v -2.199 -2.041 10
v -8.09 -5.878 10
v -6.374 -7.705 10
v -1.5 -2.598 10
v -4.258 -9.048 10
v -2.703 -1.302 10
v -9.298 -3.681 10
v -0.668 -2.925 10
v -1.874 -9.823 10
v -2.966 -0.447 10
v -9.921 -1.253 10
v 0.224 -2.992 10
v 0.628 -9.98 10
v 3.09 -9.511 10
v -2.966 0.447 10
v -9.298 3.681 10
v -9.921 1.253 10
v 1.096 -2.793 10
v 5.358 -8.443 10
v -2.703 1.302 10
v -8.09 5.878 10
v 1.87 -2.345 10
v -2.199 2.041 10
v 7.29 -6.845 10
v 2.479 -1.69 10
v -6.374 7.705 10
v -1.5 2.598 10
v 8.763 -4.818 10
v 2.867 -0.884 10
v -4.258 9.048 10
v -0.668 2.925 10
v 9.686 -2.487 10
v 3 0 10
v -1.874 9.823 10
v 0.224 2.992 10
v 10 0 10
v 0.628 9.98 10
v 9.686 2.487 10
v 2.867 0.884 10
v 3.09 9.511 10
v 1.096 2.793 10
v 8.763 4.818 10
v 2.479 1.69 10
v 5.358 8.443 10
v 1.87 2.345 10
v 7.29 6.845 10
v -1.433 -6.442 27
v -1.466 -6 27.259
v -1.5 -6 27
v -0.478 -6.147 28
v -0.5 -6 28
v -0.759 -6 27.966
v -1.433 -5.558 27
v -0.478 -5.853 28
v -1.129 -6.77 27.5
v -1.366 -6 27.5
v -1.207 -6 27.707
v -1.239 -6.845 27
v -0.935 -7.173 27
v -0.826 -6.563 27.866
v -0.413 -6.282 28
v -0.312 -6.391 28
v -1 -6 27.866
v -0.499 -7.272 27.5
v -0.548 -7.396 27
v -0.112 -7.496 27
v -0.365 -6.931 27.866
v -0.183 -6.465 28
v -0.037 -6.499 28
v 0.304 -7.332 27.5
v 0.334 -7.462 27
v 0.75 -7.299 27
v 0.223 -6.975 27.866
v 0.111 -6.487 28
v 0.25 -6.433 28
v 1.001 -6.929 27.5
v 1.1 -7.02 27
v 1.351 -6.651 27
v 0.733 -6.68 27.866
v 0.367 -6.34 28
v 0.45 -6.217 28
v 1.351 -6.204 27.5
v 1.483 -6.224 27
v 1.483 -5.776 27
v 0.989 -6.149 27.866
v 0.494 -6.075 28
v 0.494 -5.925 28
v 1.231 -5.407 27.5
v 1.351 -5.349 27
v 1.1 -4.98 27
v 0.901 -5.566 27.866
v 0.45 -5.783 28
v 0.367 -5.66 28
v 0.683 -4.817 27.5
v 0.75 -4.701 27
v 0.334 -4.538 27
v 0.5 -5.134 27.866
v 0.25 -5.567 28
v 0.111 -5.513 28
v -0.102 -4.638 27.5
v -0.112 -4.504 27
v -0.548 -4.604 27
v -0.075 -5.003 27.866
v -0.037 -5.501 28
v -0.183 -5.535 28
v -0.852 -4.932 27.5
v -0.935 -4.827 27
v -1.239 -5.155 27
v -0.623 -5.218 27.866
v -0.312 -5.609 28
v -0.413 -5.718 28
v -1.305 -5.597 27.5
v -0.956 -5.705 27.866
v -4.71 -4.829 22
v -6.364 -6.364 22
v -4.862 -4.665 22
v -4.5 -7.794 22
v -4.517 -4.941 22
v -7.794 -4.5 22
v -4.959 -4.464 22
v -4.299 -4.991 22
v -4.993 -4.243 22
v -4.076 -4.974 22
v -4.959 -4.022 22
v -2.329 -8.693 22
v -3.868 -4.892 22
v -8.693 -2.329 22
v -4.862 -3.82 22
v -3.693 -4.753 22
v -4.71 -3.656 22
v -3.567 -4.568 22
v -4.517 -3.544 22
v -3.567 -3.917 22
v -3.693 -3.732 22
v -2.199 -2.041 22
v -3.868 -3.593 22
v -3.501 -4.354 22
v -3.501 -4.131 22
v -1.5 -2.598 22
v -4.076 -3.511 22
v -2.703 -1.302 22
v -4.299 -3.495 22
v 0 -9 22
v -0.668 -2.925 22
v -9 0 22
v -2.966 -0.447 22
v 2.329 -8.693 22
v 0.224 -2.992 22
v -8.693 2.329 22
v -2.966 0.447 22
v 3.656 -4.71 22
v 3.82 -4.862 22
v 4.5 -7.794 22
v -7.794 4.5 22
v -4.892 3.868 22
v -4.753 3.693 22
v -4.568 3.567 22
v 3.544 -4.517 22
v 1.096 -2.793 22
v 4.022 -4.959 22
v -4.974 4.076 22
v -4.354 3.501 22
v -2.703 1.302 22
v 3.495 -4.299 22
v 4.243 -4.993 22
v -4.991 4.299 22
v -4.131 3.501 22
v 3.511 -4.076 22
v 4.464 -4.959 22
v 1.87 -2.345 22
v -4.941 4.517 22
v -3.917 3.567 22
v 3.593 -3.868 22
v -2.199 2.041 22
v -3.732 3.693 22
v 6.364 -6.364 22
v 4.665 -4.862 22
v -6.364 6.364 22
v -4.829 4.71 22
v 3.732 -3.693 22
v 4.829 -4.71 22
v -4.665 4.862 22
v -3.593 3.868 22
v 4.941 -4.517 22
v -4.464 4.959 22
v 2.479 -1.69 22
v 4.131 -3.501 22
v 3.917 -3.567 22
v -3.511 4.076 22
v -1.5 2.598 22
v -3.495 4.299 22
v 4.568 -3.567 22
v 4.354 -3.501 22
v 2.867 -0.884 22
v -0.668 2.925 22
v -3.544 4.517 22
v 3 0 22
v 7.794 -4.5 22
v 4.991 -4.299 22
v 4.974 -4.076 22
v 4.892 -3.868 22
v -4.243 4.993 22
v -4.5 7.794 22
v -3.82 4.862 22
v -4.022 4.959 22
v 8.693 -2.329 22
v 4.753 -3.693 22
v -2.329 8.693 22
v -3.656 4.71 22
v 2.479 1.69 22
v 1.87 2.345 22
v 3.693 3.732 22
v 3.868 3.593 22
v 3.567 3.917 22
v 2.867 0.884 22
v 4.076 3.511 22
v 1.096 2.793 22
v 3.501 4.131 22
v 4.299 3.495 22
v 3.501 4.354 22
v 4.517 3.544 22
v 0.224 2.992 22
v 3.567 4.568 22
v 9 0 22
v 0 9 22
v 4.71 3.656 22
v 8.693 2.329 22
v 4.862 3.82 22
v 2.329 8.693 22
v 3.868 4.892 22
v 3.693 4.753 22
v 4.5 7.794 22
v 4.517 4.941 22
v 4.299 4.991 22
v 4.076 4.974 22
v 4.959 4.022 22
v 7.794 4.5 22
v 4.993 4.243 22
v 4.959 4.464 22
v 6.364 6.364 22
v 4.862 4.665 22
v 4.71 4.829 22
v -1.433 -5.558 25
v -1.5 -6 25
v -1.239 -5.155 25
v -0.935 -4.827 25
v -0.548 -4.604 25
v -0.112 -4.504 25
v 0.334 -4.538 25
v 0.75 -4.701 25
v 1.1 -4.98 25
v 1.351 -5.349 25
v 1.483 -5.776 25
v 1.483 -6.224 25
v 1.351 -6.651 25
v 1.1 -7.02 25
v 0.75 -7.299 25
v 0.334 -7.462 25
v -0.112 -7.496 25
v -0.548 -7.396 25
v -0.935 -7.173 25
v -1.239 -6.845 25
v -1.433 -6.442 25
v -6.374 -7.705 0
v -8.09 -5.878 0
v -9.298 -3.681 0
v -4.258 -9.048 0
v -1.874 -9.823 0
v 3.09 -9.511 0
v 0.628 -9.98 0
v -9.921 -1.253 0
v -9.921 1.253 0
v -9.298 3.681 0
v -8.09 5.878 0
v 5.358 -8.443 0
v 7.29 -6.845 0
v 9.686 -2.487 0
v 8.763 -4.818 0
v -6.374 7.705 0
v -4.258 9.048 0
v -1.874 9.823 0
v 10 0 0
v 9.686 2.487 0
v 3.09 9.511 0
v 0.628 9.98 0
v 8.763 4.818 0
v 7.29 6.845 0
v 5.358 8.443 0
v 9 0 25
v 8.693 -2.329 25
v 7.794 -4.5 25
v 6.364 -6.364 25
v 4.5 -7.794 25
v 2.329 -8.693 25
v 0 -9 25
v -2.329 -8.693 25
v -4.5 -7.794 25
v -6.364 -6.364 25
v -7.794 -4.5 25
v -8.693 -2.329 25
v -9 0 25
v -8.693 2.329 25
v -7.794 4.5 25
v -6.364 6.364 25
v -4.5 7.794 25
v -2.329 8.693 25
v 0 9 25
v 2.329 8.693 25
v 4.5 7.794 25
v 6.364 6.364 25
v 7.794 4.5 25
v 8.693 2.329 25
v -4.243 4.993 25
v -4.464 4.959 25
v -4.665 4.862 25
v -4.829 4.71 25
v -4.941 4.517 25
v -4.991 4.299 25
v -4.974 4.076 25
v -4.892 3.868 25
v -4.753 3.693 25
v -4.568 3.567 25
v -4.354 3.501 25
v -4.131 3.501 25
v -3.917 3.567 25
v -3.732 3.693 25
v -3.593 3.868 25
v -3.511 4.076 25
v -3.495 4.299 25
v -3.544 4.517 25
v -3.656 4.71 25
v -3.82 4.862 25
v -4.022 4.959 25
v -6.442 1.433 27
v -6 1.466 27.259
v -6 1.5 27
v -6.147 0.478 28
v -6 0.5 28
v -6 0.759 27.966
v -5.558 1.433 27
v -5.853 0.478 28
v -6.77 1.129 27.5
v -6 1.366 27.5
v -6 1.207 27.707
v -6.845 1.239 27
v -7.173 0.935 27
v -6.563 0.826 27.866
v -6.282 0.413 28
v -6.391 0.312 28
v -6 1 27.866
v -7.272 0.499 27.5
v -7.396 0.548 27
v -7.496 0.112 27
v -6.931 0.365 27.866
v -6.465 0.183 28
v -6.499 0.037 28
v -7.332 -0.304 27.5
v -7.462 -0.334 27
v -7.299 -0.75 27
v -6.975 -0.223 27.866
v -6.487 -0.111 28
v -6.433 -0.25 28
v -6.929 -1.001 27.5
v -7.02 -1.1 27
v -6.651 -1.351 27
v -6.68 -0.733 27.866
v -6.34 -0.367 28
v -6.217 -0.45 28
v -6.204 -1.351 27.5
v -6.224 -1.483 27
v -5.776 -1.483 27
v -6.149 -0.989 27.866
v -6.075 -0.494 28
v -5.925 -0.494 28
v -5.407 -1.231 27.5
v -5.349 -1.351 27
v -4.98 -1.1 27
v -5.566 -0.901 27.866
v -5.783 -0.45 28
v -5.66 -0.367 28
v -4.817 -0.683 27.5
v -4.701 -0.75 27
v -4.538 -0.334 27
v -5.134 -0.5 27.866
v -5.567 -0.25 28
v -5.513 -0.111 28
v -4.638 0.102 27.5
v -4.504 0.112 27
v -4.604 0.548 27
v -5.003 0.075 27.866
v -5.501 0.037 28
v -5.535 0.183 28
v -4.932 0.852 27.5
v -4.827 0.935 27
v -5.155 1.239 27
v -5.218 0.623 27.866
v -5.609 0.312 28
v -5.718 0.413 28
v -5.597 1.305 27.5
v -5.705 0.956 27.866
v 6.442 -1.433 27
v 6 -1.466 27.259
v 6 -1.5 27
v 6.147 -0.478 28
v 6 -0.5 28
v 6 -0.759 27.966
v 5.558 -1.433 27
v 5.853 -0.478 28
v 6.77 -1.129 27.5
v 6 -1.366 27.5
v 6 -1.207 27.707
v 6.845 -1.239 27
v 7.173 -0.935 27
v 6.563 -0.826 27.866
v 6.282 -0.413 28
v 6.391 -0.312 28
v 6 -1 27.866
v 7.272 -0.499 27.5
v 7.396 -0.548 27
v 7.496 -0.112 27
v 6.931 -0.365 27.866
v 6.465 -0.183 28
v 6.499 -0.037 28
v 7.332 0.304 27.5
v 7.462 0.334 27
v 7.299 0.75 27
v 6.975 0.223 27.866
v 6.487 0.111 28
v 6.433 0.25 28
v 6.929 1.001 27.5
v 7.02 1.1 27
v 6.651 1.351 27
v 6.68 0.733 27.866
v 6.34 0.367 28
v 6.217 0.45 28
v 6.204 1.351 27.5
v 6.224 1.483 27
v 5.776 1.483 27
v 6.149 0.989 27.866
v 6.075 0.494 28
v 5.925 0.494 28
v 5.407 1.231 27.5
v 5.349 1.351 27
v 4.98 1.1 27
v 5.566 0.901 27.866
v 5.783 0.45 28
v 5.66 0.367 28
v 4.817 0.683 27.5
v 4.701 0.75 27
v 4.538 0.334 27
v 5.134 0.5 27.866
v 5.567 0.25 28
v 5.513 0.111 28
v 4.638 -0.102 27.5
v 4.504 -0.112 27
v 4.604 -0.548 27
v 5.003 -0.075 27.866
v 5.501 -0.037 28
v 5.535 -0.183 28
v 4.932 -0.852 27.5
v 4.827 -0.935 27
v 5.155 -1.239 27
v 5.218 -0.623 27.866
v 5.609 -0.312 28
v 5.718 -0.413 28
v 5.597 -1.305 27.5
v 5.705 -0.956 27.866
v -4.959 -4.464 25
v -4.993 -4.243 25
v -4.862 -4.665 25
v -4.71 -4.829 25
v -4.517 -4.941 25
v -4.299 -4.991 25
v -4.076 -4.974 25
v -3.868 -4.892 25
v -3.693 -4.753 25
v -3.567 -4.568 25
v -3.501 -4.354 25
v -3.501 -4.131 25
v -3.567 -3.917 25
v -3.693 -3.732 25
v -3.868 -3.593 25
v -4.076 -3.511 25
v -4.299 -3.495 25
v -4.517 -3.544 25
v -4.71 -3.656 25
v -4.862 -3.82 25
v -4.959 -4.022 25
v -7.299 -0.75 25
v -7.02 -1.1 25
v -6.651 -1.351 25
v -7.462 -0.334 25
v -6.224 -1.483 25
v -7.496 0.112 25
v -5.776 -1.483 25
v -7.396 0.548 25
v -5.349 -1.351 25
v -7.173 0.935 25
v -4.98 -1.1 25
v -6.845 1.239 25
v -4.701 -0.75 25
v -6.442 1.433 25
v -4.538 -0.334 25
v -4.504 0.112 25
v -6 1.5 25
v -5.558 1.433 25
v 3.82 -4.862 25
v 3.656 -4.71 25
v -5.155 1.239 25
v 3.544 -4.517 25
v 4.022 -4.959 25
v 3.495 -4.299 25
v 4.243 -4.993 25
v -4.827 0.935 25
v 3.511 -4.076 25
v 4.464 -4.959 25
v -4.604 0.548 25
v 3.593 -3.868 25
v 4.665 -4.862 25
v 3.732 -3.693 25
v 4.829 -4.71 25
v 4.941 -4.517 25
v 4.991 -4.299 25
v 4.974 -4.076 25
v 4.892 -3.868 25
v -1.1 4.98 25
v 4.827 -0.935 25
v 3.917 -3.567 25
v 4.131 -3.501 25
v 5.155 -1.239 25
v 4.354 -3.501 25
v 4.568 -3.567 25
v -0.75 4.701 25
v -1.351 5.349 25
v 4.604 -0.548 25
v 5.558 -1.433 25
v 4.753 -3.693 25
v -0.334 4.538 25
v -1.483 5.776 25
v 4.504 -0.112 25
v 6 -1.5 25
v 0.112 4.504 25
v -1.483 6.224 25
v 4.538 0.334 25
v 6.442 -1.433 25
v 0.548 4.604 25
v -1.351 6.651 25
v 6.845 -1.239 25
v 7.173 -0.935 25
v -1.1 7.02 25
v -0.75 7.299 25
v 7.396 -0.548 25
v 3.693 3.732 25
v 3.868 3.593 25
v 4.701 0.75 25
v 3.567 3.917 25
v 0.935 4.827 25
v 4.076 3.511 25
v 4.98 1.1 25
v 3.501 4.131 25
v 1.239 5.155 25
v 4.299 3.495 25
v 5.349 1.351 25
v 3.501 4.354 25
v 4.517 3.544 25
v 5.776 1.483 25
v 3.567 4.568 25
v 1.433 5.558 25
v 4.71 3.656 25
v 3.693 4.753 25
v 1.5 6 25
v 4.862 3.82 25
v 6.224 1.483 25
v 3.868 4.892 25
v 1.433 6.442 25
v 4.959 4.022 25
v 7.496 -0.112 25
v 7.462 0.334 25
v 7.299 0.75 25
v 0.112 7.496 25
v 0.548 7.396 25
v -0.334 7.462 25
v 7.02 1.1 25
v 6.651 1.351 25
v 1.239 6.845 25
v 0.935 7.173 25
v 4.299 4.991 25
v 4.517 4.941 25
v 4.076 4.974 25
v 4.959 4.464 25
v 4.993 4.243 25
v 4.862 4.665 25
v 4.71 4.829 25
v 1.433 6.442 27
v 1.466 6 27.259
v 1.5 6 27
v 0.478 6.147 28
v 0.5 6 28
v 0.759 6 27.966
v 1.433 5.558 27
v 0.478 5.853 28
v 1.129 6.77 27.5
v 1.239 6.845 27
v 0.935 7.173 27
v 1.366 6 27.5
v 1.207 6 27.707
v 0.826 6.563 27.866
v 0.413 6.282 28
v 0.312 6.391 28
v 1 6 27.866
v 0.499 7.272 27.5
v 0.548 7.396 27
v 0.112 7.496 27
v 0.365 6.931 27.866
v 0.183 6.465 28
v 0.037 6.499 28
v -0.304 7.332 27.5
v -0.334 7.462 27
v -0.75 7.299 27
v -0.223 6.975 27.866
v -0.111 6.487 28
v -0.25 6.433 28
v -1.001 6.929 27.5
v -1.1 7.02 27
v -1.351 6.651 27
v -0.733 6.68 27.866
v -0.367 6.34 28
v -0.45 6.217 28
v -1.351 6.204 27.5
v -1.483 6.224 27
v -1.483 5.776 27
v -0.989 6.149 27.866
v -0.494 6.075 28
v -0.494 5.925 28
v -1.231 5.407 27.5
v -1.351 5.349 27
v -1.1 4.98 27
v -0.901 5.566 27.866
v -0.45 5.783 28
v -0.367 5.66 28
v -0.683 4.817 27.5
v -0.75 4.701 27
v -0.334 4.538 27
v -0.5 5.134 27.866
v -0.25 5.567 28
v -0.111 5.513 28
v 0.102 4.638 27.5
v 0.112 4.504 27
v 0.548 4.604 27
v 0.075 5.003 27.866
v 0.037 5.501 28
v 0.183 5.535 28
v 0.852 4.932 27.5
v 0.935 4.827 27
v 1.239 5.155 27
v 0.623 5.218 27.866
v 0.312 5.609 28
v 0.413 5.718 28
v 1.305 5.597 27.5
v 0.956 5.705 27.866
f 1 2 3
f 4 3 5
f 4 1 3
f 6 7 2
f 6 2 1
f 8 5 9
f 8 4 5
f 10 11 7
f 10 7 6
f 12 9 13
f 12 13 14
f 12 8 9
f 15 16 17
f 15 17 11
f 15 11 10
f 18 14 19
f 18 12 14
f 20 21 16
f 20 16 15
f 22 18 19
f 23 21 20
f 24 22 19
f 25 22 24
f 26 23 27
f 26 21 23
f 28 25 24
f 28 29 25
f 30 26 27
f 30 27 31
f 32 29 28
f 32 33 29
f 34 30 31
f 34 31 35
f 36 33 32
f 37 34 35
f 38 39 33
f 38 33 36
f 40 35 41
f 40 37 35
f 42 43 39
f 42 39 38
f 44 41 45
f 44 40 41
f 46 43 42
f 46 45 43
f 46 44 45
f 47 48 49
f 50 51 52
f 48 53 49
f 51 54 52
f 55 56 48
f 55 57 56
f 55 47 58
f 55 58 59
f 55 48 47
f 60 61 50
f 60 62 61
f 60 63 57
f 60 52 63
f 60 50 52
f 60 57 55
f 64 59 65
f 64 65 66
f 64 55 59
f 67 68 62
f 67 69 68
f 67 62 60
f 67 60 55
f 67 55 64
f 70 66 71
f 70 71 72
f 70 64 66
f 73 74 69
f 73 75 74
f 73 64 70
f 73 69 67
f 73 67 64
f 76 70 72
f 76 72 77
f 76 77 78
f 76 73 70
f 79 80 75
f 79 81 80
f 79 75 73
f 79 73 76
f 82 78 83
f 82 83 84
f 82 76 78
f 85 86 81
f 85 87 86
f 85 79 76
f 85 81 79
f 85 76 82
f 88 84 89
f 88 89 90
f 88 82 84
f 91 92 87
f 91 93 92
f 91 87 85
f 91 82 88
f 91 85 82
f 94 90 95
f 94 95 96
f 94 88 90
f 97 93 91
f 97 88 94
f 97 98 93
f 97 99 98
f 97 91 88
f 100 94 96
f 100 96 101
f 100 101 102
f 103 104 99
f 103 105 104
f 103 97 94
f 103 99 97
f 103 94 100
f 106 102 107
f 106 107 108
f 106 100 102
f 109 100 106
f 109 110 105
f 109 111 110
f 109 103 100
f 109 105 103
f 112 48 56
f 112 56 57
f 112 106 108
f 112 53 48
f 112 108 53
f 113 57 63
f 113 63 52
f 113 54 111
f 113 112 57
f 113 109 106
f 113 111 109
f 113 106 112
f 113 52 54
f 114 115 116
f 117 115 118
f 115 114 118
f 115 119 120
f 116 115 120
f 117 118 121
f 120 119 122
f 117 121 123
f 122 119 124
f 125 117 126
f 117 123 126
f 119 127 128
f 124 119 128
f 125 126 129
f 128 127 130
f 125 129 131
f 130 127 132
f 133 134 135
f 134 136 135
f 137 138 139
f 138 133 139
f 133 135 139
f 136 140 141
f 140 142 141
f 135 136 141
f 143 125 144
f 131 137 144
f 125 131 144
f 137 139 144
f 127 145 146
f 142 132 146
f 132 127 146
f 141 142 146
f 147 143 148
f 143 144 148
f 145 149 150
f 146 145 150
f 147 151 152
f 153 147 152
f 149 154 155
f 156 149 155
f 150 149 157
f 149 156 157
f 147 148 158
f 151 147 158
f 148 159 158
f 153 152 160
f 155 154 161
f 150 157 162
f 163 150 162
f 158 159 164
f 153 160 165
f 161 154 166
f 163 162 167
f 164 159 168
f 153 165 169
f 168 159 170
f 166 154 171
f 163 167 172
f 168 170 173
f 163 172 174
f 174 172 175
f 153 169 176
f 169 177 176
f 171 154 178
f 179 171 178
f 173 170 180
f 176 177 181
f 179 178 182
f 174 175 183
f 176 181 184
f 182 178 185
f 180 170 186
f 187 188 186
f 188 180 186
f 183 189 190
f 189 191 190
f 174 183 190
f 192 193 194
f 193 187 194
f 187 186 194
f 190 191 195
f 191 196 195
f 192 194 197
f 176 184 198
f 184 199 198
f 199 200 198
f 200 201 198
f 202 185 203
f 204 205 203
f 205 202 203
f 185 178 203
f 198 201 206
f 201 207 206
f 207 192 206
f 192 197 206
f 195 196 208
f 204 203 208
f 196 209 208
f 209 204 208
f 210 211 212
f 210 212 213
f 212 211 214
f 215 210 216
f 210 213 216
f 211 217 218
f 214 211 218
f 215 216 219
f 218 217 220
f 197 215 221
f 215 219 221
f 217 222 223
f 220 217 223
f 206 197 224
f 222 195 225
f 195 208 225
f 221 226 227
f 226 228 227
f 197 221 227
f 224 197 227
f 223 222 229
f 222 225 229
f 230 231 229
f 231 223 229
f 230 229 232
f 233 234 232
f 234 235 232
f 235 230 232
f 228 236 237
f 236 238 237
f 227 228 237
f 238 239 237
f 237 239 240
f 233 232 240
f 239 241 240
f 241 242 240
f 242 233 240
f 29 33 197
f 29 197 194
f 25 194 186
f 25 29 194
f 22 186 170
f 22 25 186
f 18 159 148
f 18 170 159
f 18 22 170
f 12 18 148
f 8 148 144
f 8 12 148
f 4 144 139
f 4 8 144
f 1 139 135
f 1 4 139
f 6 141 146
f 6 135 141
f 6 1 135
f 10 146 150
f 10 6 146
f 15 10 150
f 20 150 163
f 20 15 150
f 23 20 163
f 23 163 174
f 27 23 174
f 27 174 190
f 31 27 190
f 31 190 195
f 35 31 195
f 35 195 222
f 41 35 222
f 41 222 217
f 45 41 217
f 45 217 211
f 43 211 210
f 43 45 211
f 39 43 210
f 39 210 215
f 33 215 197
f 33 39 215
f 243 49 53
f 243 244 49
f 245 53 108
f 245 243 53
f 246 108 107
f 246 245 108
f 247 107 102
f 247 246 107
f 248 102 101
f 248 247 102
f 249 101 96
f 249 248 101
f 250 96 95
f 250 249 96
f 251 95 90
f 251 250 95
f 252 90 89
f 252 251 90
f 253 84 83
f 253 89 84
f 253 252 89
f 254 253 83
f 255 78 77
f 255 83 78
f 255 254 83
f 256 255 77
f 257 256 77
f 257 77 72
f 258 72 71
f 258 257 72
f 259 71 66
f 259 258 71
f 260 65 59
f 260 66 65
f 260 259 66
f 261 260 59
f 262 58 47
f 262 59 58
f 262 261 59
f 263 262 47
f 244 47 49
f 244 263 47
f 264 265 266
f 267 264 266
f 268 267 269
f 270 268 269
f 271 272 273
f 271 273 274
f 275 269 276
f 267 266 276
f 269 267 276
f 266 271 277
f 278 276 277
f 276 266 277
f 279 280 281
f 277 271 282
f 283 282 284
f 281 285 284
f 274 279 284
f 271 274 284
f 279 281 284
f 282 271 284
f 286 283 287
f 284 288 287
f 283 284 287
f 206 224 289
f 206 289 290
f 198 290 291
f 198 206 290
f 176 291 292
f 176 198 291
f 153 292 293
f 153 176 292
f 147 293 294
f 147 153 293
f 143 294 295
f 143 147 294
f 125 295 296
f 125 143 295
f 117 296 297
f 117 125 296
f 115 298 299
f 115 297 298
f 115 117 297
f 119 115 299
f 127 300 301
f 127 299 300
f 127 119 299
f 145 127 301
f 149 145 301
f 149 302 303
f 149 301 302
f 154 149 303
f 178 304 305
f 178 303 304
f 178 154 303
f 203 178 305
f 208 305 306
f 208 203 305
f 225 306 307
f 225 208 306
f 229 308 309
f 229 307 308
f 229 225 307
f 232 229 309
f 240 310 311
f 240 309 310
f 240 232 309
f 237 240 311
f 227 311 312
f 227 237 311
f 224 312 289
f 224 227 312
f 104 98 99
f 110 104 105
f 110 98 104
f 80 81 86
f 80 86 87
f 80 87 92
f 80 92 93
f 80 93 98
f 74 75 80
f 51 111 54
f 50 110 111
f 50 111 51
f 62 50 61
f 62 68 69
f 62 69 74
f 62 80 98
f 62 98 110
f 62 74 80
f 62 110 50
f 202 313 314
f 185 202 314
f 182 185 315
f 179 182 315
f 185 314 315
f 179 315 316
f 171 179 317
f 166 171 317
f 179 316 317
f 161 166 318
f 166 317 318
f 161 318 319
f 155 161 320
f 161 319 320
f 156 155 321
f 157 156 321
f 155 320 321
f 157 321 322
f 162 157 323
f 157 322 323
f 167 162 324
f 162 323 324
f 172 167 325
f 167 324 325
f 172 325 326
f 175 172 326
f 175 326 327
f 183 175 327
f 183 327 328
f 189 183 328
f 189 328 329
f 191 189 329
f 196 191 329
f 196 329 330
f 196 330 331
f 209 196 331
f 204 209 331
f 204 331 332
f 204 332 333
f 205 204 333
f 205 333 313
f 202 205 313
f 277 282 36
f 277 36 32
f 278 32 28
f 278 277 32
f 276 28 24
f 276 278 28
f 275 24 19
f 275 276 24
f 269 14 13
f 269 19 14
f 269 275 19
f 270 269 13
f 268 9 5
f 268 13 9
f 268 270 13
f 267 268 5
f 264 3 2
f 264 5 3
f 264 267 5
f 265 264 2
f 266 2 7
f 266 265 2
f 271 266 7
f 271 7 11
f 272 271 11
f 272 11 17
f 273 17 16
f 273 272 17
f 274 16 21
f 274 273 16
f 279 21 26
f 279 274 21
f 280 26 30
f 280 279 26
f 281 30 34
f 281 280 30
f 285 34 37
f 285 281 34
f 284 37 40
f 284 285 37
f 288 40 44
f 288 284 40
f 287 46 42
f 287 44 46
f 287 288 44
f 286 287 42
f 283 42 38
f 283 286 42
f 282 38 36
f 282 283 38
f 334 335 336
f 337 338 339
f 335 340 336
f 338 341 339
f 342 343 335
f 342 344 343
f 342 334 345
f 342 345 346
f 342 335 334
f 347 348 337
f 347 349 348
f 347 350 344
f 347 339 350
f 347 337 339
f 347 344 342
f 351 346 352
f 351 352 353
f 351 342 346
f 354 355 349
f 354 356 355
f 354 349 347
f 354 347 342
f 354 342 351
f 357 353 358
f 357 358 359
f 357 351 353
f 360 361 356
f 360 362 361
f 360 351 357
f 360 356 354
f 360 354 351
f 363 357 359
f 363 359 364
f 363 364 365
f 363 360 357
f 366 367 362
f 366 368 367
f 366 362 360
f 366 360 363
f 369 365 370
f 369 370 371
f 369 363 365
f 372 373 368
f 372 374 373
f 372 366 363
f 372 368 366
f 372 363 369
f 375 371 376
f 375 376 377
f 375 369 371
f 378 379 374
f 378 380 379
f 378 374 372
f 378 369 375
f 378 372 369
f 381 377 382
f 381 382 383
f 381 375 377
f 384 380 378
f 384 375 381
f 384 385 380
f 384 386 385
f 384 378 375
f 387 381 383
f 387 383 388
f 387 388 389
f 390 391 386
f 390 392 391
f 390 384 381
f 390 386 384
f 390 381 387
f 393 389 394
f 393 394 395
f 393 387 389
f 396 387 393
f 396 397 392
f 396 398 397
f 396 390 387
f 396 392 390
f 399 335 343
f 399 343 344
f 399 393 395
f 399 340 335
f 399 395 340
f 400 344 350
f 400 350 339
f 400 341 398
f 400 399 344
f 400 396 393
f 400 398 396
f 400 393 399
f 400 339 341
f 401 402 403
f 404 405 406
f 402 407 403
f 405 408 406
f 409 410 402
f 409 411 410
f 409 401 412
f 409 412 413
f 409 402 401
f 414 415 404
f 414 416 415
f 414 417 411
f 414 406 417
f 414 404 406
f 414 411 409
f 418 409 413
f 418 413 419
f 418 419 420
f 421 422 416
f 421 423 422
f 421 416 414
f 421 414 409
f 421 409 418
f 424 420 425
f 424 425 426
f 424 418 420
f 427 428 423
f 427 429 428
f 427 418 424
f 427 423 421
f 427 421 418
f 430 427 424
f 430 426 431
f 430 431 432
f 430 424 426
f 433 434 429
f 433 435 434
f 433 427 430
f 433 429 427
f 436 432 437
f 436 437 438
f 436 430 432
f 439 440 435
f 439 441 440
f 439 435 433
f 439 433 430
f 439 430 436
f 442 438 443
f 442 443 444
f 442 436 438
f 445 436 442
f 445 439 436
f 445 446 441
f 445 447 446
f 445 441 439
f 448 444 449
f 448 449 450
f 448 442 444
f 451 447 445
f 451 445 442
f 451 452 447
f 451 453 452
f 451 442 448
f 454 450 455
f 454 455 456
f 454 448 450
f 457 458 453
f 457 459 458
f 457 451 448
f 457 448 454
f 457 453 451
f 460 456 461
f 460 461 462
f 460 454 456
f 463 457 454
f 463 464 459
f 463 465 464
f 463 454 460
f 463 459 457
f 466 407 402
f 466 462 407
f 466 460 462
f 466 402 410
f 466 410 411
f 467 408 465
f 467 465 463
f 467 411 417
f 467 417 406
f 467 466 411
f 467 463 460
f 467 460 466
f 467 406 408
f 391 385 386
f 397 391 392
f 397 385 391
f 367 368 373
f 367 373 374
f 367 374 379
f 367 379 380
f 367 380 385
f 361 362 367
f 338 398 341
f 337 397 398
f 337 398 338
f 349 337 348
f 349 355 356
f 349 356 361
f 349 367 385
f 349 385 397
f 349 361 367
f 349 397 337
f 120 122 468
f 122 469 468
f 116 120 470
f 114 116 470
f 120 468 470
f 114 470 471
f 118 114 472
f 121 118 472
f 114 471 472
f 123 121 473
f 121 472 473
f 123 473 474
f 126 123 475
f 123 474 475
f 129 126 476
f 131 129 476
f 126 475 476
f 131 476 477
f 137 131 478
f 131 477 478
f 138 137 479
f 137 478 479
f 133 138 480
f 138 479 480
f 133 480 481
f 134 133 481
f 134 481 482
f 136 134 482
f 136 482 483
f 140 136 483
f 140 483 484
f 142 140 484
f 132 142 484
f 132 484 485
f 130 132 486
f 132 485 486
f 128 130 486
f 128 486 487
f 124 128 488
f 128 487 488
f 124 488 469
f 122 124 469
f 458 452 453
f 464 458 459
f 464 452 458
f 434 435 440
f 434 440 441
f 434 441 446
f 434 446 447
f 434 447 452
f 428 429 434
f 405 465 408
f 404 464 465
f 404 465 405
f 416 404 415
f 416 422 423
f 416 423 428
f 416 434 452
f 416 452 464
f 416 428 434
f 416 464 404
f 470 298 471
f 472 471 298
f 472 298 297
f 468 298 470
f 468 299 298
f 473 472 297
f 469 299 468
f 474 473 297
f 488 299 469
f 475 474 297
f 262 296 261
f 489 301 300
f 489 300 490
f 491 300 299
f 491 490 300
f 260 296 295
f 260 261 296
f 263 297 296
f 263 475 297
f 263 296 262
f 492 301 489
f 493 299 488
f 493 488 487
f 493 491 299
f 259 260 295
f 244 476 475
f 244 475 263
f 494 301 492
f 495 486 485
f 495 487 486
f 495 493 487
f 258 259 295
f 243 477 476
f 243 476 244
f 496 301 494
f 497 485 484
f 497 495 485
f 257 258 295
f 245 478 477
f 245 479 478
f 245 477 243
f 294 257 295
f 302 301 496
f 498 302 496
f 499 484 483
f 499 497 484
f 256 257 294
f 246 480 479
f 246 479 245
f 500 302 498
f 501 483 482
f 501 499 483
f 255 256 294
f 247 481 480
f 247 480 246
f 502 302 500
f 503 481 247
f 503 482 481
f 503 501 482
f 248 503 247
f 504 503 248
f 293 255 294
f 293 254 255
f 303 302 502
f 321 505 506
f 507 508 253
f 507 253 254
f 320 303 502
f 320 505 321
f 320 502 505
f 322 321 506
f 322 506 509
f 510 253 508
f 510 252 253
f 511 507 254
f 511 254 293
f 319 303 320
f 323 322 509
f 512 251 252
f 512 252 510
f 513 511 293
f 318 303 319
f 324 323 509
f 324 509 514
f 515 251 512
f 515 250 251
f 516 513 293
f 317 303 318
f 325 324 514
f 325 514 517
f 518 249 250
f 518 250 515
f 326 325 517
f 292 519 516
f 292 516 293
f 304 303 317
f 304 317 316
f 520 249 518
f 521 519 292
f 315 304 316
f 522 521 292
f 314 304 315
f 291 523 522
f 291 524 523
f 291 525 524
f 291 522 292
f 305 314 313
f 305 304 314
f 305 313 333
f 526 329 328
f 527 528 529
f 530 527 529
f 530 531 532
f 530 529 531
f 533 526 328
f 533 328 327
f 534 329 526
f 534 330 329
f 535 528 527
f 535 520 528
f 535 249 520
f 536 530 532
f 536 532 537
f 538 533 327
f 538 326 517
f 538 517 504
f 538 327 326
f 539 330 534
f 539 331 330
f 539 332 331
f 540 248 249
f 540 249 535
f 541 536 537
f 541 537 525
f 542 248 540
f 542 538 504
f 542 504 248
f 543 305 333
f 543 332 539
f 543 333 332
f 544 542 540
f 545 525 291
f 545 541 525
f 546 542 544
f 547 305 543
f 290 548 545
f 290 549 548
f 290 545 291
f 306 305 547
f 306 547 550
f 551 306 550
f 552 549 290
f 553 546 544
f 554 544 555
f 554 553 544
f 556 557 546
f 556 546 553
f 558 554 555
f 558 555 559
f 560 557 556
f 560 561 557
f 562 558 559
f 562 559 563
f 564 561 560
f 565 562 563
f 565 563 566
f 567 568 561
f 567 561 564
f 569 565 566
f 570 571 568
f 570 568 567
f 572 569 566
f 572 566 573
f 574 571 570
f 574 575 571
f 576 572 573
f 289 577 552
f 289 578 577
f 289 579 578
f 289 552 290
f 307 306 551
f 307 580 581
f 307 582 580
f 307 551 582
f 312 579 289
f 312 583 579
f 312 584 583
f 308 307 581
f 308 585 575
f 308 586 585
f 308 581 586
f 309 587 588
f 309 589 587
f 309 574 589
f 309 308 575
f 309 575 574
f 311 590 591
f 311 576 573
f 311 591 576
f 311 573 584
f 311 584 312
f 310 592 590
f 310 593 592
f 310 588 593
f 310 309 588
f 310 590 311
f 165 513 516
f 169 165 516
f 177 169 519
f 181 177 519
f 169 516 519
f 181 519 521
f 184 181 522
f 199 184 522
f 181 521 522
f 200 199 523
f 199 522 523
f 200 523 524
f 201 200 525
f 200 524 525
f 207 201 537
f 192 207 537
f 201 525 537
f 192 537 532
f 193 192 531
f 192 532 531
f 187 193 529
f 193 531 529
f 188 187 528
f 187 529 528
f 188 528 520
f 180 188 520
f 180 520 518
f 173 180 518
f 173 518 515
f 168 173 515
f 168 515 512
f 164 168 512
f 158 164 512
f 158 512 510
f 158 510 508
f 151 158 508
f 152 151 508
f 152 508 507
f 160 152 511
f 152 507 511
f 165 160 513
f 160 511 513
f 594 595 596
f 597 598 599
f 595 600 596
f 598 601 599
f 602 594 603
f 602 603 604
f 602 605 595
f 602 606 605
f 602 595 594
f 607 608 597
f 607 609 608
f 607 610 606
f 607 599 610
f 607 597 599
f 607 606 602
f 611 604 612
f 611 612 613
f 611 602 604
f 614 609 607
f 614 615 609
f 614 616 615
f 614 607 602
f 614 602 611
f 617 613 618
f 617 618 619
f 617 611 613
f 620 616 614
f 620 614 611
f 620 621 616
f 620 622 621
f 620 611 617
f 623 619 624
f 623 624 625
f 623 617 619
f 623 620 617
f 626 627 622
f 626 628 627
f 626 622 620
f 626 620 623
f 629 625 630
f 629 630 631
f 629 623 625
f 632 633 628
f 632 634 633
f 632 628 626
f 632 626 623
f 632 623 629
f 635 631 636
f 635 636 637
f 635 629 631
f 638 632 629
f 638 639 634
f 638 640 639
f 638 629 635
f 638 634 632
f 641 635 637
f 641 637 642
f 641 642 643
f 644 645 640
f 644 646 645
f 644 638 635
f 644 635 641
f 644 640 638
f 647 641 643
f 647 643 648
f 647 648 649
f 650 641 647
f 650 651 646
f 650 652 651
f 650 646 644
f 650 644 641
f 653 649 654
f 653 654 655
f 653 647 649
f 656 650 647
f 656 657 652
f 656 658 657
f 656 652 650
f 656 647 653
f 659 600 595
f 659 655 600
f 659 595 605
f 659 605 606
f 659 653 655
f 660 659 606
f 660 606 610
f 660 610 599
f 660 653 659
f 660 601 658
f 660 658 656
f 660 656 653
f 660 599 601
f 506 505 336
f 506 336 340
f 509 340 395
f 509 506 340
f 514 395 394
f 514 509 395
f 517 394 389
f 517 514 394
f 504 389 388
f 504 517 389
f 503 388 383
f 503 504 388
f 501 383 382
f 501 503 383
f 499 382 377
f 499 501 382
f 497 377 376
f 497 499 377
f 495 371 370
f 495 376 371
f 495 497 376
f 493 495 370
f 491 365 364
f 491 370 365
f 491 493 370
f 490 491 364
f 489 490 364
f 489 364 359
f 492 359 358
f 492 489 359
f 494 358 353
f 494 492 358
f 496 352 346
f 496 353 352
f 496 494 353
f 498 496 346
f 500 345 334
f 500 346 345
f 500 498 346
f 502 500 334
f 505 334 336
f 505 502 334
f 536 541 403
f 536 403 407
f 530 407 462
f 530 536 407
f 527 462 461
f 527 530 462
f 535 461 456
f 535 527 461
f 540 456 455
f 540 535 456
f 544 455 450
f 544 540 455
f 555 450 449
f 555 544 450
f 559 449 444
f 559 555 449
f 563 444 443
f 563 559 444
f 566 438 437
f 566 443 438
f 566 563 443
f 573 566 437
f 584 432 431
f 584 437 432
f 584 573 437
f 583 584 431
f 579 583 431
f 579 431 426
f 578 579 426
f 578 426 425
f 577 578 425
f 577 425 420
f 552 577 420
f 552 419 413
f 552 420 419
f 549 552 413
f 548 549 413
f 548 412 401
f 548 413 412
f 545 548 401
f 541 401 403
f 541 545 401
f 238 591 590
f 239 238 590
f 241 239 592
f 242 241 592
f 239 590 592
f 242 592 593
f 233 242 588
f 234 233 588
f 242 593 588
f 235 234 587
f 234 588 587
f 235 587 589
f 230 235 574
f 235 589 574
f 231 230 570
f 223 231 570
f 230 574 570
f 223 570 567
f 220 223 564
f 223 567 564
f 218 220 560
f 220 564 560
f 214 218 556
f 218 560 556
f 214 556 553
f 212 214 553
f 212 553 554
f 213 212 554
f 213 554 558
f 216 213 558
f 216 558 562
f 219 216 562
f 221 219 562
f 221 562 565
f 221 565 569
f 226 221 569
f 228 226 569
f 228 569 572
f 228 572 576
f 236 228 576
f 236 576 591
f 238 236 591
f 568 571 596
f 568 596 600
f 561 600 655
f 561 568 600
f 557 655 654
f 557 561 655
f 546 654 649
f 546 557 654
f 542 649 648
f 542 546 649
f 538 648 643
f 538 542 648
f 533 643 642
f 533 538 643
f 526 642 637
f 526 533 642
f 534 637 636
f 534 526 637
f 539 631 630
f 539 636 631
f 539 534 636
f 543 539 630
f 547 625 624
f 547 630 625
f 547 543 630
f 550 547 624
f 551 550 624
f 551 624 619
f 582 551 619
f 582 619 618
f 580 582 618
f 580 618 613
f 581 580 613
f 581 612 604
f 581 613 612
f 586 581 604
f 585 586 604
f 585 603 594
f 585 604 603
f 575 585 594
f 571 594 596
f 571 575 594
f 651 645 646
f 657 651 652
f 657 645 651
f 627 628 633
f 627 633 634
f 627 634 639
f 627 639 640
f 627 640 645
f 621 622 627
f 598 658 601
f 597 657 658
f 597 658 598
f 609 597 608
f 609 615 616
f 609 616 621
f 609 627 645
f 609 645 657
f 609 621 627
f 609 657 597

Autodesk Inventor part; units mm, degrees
ref_plane "YZ Plane" through (0, 0, 0) normal (1, 0, 0) x (0, 1, 0)
ref_plane "XZ Plane" through (0, 0, 0) normal (0, 1, 0) x (-1, 0, 0)
ref_plane "XY Plane" through (0, 0, 0) normal (0, 0, 1) x (1, 0, 0)
sketch "Sketch1" plane through (0, 0, 0) normal (0, 0, 1) x (1, 0, 0)
  circle A0 centre (0, 0) radius 10
  dimension "d0" = 20
extrude "Extrusion1" add sketch "Sketch1" along normal blind 10
sketch "Sketch2" plane through (0, 0, 10) normal (0, 0, 1) x (1, 0, 0)
  circle A0 centre (0, 0) radius 3
  dimension "d3" = 6
extrude "Extrusion2" add sketch "Sketch2" along normal blind 12
sketch "Sketch3" plane through (0, 0, 22) normal (0, 0, 1) x (1, 0, 0)
  circle A0 centre (0, 0) radius 9
  dimension "d6" = 18
extrude "Extrusion3" add sketch "Sketch3" along normal blind 3
sketch "Sketch4" plane through (0, 0, 25) normal (0, 0, 1) x (1, 0, 0)
  circle A0 centre (0, 6) radius 1.5
  circle A1 centre (4.2426, 4.2426) radius 0.75
  line L0 (0, 0) -> (0, 14.9818) construction
  line L1 (0, 0) -> (4.2426, 4.2426) construction
  dimension "d9" = 3
  dimension "d10" = 1.5
  dimension "d11" = 0
  dimension "d12" = 6
  dimension "d13" = 45
  dimension "d14" = 0
  dimension "d15" = 6
  dimension "d16" = 0
extrude "Extrusion4" add sketch "Sketch4" along normal blind 3 contours A0
extrude "Extrusion5" cut sketch "Sketch4" against normal blind 3 contours A1
fillet "Fillet1" radius 1 1 edges at (-1.5, 6, 28)
pattern_circular "Circular Pattern1" count 4 over 360 about axis through (0, 0, 22) along (0, 0, 1) of "Extrusion4", "Fillet1", "Extrusion5"
properties part number "Motor1Gear"
